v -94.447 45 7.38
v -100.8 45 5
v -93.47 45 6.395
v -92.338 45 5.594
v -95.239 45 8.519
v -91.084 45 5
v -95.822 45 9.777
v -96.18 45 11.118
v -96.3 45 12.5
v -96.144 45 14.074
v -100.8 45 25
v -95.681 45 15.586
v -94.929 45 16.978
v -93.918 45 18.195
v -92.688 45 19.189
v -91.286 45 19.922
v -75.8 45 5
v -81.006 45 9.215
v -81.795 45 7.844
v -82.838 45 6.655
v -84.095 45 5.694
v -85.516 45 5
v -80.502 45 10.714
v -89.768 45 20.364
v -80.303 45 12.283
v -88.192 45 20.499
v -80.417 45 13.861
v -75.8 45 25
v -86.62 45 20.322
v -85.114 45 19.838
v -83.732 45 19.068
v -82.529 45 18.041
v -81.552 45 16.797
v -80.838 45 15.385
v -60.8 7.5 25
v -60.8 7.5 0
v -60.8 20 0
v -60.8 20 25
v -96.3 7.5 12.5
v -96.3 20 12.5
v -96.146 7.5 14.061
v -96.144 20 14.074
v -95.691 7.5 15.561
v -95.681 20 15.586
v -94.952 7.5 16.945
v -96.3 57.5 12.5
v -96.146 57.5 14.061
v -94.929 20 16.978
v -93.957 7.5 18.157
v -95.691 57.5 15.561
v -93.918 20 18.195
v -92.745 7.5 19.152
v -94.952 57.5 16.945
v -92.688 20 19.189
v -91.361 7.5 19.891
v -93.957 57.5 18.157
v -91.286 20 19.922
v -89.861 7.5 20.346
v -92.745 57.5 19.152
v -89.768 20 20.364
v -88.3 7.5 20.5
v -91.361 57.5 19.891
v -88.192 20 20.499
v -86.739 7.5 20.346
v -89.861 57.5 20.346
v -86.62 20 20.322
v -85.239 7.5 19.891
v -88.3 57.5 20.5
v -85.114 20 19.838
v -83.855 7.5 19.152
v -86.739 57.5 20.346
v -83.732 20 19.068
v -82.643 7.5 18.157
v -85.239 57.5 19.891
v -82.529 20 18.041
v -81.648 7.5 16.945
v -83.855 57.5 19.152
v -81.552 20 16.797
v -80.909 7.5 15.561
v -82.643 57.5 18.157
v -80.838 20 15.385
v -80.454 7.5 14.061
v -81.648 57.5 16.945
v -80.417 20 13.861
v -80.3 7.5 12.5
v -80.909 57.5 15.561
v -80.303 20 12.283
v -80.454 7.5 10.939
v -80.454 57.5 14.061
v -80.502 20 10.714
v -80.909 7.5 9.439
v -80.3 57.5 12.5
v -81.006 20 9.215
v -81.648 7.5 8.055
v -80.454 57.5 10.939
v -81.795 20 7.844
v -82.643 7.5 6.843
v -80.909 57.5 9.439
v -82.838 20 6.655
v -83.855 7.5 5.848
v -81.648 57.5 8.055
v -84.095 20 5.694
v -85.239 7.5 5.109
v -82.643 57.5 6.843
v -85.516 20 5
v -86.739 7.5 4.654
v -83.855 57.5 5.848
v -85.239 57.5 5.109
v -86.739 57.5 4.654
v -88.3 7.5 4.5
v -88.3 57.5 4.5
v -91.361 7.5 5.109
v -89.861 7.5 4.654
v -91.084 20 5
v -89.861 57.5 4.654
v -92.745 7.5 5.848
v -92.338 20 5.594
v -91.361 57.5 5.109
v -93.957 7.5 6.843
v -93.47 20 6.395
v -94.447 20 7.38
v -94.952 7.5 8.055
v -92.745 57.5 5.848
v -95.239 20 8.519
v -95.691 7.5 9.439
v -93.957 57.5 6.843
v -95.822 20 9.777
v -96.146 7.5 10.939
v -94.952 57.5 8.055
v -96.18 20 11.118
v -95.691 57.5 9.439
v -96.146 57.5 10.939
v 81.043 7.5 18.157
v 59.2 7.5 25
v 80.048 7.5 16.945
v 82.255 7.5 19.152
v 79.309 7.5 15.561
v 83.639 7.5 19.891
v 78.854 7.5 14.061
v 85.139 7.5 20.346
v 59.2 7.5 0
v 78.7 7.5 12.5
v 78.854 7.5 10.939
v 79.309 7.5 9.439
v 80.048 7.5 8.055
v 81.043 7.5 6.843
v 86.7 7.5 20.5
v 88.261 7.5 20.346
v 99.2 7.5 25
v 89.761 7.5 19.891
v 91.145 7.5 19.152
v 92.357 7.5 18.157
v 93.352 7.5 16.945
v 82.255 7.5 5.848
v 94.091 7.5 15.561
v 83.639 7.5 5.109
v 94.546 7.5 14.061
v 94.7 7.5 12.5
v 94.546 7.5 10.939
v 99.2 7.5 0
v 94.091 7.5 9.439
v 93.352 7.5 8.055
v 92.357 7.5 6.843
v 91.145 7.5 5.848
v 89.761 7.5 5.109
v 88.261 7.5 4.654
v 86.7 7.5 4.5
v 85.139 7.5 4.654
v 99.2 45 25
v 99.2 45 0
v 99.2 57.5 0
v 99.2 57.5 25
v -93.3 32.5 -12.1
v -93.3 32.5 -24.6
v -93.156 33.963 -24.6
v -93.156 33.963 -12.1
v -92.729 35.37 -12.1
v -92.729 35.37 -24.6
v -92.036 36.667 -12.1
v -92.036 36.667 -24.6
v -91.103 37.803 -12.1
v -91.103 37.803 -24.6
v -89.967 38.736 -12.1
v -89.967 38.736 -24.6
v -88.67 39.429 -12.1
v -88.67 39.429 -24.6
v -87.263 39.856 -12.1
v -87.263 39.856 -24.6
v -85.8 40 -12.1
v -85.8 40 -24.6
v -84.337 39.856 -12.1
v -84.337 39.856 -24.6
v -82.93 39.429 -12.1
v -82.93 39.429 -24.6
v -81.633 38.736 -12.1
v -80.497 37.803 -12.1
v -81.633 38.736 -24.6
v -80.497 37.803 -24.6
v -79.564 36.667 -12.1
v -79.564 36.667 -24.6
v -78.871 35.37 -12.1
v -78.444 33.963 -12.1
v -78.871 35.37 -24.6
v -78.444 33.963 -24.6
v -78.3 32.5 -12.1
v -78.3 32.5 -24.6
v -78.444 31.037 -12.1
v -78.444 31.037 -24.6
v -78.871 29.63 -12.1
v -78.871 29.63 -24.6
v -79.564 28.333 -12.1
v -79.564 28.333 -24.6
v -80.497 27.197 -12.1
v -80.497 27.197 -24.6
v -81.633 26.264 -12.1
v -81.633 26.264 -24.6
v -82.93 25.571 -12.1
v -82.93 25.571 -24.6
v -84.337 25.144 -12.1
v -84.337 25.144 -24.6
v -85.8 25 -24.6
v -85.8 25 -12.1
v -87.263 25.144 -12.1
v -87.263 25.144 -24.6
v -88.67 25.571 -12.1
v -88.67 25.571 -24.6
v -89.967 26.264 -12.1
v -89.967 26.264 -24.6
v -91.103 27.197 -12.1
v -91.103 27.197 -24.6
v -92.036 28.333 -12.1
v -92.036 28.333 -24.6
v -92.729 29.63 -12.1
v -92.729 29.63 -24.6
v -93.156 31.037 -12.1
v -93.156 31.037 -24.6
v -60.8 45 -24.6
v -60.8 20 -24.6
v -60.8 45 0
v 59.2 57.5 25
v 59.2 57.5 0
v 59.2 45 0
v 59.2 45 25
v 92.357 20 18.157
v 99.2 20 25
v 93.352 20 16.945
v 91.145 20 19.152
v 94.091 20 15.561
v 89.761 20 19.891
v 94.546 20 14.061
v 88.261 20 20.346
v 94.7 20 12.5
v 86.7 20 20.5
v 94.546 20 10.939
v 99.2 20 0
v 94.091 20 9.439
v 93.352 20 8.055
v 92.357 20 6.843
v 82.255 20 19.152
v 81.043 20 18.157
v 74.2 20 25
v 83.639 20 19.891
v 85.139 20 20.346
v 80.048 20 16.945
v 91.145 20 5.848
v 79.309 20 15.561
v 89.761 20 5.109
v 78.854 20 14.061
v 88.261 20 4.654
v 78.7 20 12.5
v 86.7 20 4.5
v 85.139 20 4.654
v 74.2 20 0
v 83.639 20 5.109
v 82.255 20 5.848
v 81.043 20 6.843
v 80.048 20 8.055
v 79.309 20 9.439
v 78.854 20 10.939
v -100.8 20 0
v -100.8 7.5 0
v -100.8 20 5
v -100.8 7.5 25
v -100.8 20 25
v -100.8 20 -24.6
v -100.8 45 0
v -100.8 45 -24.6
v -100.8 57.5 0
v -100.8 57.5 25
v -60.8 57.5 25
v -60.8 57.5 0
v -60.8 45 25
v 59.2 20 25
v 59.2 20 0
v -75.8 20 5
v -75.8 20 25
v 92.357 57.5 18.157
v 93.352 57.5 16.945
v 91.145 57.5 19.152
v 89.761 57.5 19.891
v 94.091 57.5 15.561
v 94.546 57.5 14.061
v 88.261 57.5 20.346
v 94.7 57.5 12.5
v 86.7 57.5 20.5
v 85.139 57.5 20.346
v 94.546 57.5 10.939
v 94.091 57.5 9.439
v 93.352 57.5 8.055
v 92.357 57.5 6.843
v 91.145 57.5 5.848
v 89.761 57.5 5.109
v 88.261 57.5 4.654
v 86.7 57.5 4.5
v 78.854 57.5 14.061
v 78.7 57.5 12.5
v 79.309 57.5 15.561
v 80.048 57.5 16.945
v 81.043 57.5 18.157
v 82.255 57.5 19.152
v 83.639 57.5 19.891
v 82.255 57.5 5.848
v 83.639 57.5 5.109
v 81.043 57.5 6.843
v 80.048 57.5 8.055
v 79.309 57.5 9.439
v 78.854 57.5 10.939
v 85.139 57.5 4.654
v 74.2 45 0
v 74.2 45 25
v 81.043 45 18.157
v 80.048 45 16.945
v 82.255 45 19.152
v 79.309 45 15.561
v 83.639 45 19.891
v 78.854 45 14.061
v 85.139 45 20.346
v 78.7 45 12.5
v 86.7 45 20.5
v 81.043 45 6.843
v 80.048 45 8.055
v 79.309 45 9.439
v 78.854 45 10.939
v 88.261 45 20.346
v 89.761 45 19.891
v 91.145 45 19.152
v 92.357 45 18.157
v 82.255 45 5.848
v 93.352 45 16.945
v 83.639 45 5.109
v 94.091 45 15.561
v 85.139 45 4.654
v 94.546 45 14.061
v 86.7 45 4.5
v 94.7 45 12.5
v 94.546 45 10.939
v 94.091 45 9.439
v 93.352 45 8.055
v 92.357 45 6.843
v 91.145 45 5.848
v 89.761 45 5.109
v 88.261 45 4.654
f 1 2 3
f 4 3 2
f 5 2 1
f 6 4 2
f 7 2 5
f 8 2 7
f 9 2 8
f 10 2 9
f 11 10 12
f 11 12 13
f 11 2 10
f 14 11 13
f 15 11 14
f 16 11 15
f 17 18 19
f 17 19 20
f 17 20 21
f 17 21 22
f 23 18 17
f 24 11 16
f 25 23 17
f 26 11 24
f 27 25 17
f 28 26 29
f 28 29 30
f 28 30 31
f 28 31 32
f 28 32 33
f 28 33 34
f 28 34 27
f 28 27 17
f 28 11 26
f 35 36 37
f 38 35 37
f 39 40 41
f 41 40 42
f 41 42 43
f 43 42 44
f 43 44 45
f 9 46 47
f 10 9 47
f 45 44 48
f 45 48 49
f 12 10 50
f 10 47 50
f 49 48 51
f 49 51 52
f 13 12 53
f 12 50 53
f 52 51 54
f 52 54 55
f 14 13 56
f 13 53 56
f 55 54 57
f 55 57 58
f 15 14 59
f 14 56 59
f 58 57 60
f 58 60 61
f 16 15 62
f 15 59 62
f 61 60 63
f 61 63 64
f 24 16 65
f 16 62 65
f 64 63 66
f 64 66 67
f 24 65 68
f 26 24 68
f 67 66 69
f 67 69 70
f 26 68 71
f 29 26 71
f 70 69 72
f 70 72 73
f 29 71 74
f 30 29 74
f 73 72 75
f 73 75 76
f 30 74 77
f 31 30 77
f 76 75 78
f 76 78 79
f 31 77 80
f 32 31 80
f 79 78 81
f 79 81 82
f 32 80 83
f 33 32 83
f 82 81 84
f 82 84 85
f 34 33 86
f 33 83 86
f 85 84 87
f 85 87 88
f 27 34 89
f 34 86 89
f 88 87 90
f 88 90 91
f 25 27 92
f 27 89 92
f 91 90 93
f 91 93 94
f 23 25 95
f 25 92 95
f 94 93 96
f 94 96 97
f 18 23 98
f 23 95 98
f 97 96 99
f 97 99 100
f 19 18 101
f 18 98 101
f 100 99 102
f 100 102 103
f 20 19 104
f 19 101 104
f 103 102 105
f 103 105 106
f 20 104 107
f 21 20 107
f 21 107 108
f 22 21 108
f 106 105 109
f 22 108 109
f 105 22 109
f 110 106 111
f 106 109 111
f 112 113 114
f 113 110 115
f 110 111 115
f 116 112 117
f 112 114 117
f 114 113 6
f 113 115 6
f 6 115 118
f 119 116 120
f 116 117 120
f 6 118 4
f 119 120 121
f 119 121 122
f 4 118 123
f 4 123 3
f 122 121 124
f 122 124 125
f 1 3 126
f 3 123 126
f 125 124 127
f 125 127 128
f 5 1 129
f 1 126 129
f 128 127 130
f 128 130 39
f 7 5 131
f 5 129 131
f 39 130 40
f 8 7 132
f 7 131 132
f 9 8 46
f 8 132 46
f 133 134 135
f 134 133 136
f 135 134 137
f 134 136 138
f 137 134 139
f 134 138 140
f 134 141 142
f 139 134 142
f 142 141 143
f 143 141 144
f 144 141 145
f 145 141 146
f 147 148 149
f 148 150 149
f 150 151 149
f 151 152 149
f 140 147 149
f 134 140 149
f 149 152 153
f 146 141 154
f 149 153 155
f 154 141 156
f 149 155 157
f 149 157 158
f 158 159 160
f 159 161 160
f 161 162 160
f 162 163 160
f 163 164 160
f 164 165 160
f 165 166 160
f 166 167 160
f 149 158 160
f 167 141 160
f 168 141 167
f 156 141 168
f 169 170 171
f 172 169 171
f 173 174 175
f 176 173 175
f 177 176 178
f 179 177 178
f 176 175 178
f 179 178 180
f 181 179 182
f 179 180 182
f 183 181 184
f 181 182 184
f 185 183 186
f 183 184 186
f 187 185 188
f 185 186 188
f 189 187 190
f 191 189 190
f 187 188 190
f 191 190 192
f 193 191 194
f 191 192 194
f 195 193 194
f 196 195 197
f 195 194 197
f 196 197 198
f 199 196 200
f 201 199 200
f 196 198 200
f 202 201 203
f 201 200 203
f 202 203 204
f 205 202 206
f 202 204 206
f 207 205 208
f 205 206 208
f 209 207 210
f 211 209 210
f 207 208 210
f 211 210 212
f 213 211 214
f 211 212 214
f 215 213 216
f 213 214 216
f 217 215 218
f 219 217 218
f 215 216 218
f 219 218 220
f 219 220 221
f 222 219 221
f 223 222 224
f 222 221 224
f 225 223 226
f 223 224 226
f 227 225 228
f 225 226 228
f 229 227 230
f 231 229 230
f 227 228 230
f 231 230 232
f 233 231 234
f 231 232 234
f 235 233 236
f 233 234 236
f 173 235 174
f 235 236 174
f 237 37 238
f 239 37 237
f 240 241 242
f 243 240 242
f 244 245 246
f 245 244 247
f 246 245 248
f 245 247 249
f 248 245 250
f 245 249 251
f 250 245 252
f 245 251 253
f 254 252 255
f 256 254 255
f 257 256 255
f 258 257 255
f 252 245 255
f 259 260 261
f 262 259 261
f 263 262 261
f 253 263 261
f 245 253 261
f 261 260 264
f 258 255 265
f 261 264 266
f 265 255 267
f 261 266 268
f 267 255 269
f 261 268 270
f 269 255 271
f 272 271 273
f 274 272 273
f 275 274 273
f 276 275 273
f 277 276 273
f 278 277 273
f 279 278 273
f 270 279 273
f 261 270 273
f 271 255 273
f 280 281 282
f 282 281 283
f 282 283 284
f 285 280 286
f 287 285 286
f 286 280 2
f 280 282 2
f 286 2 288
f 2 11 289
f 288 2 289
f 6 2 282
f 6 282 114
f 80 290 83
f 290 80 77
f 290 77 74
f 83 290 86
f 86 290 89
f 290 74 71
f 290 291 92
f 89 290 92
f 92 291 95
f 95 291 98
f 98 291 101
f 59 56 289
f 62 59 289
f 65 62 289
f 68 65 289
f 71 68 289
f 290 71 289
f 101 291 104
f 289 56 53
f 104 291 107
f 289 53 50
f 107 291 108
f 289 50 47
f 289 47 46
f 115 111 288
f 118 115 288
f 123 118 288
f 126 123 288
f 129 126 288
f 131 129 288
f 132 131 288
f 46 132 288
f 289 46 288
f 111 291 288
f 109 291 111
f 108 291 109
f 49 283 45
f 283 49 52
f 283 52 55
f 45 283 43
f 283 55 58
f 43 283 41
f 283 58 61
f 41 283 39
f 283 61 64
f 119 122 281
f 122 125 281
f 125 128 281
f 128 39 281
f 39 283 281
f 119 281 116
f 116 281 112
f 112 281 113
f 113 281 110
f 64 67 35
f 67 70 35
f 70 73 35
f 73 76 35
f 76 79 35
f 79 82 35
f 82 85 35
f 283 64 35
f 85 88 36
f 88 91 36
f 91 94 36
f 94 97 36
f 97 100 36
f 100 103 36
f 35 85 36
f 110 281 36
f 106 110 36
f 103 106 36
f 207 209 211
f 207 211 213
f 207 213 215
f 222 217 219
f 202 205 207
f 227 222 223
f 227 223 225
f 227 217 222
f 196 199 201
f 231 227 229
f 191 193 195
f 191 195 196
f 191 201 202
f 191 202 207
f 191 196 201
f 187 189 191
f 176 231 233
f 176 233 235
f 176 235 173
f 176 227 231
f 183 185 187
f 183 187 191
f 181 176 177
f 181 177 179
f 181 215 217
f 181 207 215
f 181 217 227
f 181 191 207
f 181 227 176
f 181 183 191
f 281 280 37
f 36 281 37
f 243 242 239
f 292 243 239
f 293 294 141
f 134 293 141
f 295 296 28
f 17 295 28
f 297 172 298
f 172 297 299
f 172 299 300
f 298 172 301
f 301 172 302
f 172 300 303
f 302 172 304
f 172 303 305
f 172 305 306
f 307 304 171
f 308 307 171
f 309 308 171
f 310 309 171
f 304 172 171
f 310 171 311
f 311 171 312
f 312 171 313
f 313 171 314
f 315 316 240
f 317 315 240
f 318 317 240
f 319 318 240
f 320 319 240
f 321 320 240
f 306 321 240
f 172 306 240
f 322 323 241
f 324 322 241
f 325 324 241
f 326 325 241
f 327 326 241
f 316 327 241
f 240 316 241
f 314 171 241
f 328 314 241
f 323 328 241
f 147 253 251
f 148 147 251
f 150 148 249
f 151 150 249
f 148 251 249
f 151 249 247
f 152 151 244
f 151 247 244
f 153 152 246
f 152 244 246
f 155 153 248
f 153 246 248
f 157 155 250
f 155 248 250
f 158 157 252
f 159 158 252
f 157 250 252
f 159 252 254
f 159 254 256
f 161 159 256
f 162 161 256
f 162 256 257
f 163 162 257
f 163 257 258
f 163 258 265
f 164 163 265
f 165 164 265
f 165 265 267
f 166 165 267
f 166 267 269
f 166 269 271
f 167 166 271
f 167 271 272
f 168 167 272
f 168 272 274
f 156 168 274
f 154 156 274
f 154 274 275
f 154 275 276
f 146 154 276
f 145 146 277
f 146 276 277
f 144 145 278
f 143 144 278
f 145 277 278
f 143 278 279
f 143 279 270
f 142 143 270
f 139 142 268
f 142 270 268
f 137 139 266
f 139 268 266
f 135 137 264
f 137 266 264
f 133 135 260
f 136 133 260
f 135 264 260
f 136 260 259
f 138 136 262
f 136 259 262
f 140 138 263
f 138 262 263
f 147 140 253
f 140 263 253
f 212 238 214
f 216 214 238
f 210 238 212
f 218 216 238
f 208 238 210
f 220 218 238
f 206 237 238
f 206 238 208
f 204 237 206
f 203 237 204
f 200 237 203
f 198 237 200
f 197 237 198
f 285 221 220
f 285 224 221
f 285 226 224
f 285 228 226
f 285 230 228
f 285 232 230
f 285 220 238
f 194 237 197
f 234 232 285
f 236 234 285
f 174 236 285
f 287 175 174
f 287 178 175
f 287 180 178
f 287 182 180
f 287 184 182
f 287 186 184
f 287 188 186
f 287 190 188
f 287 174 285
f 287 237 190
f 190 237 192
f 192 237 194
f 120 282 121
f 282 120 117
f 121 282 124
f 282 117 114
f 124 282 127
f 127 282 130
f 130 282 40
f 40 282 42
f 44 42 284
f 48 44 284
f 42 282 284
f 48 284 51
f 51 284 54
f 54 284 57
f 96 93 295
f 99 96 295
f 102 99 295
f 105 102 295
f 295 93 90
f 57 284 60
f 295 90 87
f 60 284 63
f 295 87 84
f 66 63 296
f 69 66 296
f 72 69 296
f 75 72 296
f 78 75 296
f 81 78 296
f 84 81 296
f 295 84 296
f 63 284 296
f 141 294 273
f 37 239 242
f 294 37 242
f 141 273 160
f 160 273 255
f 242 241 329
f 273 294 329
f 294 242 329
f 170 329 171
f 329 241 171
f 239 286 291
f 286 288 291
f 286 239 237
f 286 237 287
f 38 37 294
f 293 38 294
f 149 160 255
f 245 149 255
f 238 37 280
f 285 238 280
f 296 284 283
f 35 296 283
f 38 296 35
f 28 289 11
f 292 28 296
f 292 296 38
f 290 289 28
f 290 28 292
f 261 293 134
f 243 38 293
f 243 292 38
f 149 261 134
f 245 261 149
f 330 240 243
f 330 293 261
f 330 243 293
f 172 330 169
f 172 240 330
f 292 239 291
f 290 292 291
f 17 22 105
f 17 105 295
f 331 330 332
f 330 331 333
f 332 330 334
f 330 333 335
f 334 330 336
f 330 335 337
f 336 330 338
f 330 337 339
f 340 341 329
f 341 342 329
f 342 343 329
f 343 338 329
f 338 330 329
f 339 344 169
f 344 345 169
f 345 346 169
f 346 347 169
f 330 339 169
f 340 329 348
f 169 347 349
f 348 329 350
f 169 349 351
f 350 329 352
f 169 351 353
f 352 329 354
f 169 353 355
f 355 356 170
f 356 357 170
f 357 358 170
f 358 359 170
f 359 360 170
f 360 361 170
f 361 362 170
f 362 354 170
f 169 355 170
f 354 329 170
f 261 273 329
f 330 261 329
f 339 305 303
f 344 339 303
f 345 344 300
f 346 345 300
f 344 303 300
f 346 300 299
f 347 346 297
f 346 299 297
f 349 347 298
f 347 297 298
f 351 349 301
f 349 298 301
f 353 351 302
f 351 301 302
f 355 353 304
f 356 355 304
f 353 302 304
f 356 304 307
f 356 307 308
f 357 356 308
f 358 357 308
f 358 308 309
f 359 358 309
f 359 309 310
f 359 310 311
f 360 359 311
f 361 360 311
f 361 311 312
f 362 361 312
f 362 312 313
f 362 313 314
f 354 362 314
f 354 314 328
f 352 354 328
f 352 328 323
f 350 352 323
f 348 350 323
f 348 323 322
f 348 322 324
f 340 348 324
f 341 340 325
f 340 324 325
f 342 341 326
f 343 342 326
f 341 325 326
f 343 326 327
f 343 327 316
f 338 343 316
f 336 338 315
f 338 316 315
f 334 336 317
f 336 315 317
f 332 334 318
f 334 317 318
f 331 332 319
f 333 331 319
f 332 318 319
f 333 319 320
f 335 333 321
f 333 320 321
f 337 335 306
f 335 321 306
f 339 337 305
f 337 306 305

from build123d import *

# Parameters (mm, degrees)
BOSS_EXTRUDE1_DEPTH = 25
SKETCH2_R           = 8
CUT_EXTRUDE1_DEPTH  = 70.5
SKETCH3_R           = 8
CUT_EXTRUDE2_DEPTH  = 88
SKETCH4_W           = 40
SKETCH4_H           = 25
BOSS_EXTRUDE2_DEPTH = 24.6
SKETCH5_R           = 7.5
CUT_EXTRUDE4_DEPTH  = 12.5
SKETCH7_W           = 25
SKETCH7_H           = 25
CUT_EXTRUDE6_DEPTH  = 20


with BuildPart() as part:
    # Sketch1 → Boss-Extrude1 (new body)
    with BuildSketch(Plane.XY):
        Polygon((59.2, 45), (-60.8, 45), (-60.8, 57.5), (-100.8, 57.5), (-100.8, 45), (-100.8, 20), (-100.8, 7.5), (-60.8, 7.5), (-60.8, 20), (59.2, 20), (59.2, 7.5), (99.2, 7.5), (99.2, 20), (74.2, 20), (74.2, 45), (99.2, 45), (99.2, 57.5), (59.2, 57.5), align=None)
    extrude(amount=BOSS_EXTRUDE1_DEPTH)

    # Sketch2 → Cut-Extrude1 (cut)
    with BuildSketch(Plane(origin=(0, 57.5, 0), x_dir=(1, 0, 0), z_dir=(0, 1, 0))):
        with Locations(Location((-88.3, -12.5, 0), (0, 0, 180))):
            Circle(SKETCH2_R)
    extrude(amount=-CUT_EXTRUDE1_DEPTH, mode=Mode.SUBTRACT)

    # Sketch3 → Cut-Extrude2 (cut)
    with BuildSketch(Plane(origin=(0, 57.5, 0), x_dir=(1, 0, 0), z_dir=(0, 1, 0))):
        with Locations(Location((86.7, -12.5, 0), (0, 0, 270))):
            Circle(SKETCH3_R)
    extrude(amount=-CUT_EXTRUDE2_DEPTH, mode=Mode.SUBTRACT)

    # Sketch4 → Boss-Extrude2 (add)
    with BuildSketch(Plane(origin=(0, 0, 0), x_dir=(-1, 0, 0), z_dir=(0, 0, -1))):
        with Locations((80.8, 32.5)):
            Rectangle(SKETCH4_W, SKETCH4_H)
    extrude(amount=BOSS_EXTRUDE2_DEPTH)

    # Sketch5 → Cut-Extrude4 (cut)
    with BuildSketch(Plane(origin=(0, 0, -24.6), x_dir=(-1, 0, 0), z_dir=(0, 0, -1))):
        with Locations((85.8, 32.5)):
            Circle(SKETCH5_R)
    extrude(amount=-CUT_EXTRUDE4_DEPTH, mode=Mode.SUBTRACT)

    # Sketch7 → Cut-Extrude6 (cut)
    with BuildSketch(Plane.XY.offset(25)):
        with Locations((-88.3, 32.5)):
            Rectangle(SKETCH7_W, SKETCH7_H)
    extrude(amount=-CUT_EXTRUDE6_DEPTH, mode=Mode.SUBTRACT)


solid = part.part
